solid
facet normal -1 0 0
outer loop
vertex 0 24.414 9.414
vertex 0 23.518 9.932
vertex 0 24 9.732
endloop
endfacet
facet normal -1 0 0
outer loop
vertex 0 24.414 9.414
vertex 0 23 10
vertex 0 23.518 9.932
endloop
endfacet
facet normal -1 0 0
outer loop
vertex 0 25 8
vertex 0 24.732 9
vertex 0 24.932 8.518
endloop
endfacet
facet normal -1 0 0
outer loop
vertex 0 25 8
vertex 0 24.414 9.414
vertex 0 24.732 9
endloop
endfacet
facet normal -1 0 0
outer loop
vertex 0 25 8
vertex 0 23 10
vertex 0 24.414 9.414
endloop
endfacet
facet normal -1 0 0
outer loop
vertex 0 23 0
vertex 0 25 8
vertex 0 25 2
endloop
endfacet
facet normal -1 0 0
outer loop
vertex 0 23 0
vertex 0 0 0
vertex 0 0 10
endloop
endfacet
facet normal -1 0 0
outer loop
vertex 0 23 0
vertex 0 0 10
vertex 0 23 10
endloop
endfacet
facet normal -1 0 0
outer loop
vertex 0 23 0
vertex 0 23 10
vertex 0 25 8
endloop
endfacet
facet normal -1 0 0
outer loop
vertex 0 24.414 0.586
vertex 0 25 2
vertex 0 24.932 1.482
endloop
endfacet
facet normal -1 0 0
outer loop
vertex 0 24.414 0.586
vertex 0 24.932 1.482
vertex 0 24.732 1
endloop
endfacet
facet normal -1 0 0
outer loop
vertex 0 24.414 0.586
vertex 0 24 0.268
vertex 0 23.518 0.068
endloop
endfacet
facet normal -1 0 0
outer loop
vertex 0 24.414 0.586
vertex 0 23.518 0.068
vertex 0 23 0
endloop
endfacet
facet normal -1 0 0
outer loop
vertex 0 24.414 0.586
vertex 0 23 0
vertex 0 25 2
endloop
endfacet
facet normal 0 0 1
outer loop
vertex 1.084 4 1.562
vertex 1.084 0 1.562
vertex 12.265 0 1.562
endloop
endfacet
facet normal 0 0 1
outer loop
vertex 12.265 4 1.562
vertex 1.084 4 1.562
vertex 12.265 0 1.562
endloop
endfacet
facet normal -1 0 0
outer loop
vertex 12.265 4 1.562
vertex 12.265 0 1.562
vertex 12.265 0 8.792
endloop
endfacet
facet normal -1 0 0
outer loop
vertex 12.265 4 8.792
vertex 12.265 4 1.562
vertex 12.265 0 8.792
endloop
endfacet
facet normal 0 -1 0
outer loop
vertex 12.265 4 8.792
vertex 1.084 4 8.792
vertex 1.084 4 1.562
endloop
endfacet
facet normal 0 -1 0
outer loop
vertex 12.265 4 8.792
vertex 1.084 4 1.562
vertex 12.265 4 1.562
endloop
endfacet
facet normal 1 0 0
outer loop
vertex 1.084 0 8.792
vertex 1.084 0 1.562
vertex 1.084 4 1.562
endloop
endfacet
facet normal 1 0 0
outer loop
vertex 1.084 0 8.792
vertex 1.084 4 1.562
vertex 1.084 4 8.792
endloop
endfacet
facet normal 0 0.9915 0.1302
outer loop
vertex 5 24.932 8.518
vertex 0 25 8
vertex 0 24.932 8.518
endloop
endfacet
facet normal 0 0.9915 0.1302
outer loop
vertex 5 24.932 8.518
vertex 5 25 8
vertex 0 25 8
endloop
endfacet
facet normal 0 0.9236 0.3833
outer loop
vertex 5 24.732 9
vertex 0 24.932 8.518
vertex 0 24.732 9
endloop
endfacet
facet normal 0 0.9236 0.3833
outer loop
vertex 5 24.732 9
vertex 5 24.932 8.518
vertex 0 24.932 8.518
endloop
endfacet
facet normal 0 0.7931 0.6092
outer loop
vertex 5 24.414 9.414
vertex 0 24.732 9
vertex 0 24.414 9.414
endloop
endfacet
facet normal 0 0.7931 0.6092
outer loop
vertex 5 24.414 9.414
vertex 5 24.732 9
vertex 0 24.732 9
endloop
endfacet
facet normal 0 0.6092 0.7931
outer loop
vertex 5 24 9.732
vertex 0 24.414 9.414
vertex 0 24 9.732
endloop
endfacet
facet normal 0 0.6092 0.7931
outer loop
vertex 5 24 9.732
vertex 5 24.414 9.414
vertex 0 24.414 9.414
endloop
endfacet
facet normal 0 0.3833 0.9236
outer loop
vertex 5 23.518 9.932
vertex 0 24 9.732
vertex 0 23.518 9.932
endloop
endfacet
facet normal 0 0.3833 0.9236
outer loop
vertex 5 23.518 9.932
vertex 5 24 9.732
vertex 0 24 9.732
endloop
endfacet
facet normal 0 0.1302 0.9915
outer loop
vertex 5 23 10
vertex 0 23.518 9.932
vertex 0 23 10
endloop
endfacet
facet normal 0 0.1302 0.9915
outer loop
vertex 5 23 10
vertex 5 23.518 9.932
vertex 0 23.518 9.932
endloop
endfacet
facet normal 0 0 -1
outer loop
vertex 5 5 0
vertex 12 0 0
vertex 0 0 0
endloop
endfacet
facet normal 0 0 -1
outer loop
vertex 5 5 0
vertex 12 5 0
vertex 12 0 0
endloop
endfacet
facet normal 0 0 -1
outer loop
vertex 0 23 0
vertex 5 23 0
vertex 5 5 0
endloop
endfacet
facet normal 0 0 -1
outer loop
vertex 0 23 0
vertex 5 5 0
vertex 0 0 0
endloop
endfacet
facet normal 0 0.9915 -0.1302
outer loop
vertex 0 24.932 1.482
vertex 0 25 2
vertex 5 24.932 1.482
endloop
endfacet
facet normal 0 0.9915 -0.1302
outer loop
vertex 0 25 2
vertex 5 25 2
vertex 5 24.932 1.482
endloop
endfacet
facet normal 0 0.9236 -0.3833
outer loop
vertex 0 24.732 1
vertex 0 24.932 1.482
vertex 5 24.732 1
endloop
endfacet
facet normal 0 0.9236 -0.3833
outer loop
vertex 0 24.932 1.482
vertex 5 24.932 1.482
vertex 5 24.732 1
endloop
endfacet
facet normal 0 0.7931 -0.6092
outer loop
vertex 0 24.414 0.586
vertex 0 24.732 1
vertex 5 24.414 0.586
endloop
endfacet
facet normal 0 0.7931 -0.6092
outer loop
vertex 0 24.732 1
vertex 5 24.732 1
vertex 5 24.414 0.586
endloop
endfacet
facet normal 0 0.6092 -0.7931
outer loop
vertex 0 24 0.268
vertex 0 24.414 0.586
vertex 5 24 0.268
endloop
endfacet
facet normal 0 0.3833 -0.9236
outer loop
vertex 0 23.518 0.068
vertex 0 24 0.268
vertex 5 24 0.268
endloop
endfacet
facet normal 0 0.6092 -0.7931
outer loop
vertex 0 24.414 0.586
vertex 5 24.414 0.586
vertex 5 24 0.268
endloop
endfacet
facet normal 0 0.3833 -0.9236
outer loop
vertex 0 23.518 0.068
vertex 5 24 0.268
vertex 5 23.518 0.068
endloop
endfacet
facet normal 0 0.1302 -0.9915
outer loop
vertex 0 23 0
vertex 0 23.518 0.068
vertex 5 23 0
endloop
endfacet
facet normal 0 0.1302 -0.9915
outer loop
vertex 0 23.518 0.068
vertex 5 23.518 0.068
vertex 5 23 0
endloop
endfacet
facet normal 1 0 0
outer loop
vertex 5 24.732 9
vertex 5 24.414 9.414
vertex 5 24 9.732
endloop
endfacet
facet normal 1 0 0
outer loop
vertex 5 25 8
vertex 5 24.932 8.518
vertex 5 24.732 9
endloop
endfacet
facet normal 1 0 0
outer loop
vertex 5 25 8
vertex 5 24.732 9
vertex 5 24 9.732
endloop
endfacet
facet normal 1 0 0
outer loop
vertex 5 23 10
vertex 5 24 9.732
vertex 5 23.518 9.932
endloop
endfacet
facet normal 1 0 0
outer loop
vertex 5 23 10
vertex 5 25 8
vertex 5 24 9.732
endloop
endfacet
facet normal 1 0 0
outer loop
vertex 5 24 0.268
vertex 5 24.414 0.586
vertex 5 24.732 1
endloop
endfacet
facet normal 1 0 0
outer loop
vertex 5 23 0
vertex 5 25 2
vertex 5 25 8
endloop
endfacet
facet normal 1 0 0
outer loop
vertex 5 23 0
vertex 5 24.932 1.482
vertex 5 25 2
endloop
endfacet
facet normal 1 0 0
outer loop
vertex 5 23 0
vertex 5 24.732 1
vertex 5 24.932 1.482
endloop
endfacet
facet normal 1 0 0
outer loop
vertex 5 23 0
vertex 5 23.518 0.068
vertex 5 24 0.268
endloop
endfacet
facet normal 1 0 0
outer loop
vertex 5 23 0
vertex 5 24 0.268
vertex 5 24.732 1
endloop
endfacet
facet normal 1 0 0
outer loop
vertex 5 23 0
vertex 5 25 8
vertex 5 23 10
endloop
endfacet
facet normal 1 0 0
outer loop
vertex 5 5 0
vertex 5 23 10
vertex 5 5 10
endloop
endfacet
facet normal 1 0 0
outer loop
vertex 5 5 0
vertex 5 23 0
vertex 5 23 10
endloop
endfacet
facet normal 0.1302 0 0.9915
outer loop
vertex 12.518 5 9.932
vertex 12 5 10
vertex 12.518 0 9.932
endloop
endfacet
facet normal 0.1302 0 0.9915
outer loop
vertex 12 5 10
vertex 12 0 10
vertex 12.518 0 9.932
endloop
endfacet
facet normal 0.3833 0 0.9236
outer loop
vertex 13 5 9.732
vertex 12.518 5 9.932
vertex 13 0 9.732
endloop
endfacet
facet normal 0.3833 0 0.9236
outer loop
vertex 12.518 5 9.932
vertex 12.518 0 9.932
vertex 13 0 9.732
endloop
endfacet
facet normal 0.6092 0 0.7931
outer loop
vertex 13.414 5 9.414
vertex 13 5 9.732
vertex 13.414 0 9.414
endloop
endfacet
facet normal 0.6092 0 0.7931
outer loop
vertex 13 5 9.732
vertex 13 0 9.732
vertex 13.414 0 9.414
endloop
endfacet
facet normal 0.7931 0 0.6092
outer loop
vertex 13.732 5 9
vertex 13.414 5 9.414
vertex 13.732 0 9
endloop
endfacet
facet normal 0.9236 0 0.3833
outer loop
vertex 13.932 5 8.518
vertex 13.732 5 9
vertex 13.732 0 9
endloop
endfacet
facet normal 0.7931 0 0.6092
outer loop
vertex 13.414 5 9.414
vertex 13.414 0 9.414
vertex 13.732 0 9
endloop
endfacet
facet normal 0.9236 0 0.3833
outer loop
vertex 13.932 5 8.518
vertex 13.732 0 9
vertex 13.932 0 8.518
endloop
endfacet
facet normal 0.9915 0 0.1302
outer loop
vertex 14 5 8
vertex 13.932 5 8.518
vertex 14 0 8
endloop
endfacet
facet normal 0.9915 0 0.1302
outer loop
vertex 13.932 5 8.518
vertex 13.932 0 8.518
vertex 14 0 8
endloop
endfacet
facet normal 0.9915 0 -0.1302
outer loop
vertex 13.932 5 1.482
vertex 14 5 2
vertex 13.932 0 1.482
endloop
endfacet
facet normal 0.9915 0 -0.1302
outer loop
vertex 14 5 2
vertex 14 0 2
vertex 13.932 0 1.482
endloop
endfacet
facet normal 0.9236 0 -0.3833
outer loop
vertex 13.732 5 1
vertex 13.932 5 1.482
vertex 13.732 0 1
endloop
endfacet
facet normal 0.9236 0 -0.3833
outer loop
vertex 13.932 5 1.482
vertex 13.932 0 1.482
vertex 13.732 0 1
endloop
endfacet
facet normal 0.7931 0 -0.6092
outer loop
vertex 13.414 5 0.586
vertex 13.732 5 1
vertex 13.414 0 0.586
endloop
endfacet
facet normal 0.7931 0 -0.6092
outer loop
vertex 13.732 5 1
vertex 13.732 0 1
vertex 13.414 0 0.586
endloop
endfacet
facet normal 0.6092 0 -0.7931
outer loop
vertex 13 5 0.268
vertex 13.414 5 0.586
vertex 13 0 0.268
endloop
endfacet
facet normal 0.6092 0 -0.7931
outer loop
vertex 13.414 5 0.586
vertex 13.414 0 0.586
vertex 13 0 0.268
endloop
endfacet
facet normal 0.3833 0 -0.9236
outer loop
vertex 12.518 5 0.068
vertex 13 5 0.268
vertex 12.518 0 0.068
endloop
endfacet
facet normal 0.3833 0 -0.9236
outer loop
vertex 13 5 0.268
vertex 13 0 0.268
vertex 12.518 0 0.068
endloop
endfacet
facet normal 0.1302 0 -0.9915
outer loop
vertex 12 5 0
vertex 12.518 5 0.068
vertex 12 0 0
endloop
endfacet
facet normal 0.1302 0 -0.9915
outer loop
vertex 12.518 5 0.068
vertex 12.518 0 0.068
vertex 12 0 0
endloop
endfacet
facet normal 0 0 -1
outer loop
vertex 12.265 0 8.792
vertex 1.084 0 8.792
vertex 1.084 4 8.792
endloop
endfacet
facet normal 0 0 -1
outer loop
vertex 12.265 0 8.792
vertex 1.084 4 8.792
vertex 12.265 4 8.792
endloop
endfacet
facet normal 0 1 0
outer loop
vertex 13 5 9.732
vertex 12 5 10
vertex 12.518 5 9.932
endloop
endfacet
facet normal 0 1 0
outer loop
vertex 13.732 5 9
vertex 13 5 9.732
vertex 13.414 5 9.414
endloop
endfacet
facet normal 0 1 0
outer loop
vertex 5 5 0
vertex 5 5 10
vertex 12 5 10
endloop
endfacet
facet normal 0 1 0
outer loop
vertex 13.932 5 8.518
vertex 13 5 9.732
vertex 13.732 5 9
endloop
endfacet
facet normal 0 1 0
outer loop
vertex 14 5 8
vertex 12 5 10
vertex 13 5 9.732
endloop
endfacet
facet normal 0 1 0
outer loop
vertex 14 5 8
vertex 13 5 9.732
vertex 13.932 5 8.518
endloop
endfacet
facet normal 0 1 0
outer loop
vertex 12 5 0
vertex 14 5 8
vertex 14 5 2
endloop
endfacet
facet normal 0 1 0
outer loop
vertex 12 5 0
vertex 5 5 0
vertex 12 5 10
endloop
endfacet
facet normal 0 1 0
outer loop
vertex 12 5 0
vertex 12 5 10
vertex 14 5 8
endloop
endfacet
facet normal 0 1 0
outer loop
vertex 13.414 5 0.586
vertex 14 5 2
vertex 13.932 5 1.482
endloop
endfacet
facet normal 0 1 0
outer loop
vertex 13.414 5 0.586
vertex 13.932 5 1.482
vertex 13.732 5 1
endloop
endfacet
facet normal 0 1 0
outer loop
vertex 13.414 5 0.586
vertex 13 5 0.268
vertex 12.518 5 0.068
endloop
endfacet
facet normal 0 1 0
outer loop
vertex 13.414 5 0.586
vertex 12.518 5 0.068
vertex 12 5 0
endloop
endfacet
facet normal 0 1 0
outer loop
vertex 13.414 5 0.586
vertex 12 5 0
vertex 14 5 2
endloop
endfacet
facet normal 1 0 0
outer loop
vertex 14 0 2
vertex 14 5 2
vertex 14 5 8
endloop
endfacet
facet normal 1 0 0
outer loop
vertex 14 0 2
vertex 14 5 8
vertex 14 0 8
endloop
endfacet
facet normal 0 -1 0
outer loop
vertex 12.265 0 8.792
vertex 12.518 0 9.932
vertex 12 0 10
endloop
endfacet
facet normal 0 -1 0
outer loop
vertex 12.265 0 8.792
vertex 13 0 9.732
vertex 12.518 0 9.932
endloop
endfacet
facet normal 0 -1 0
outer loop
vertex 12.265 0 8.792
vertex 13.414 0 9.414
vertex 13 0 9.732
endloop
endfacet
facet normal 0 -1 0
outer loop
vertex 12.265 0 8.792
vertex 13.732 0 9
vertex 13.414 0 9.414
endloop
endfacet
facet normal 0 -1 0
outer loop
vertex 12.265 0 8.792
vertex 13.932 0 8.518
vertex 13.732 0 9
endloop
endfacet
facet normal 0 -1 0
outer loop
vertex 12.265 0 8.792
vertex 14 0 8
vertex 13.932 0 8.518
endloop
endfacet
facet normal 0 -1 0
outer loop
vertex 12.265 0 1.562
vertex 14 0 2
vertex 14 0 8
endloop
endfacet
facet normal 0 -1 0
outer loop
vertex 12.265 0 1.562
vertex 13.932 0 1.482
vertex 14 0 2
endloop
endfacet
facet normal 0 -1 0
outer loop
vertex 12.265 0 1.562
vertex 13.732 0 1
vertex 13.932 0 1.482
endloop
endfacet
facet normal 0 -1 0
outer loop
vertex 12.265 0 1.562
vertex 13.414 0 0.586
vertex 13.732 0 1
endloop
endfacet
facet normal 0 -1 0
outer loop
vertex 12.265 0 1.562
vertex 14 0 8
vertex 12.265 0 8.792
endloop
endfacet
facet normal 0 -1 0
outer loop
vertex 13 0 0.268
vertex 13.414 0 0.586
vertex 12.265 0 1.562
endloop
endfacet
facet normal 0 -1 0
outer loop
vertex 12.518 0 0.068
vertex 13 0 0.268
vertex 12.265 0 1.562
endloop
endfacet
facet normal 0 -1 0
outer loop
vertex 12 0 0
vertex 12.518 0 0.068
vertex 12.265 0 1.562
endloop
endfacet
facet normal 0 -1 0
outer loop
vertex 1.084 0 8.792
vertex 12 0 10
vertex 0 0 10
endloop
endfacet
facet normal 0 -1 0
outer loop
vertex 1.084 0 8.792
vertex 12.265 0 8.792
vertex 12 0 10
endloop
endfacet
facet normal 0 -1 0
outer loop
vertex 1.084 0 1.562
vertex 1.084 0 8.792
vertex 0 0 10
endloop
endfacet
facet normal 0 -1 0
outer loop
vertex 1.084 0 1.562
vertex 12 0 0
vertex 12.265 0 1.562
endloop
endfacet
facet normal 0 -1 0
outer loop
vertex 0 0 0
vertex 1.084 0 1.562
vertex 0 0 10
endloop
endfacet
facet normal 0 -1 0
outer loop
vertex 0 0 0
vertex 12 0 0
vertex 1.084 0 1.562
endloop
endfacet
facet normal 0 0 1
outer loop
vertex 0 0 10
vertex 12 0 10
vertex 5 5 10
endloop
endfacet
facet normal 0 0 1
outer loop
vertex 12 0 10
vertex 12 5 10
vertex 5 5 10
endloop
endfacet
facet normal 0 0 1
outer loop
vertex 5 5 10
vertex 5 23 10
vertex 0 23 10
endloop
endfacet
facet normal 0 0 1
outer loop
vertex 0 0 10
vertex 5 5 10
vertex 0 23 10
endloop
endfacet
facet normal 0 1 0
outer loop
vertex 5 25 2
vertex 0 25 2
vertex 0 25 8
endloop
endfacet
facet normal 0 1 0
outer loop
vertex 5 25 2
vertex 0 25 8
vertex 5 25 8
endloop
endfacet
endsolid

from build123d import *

# Parameters (mm, degrees)
BOSS_EXTRUDE1_DEPTH = 10
FILLET1_R           = 2
FILLET2_R           = 2
FILLET3_R           = 2
FILLET4_R           = 2
SKETCH2_W           = 11.181044811
SKETCH2_H           = 7.229971792
CUT_EXTRUDE1_DEPTH  = 4


with BuildPart() as part:
    # Sketch1 → Boss-Extrude1 (new body)
    with BuildSketch(Plane.XY):
        Polygon((14, 0), (0, 0), (0, 25), (5, 25), (5, 5), (14, 5), align=None)
    extrude(amount=BOSS_EXTRUDE1_DEPTH)

    # Fillet1
    fillet1_edges = [part.edges().sort_by_distance(p)[0] for p in [
        (2.5, 25, 10),
    ]]
    fillet(fillet1_edges, radius=FILLET1_R)

    # Fillet2
    fillet2_edges = [part.edges().sort_by_distance(p)[0] for p in [
        (2.5, 25, 0),
    ]]
    fillet(fillet2_edges, radius=FILLET2_R)

    # Fillet3
    fillet3_edges = [part.edges().sort_by_distance(p)[0] for p in [
        (14, 2.5, 10),
    ]]
    fillet(fillet3_edges, radius=FILLET3_R)

    # Fillet4
    fillet4_edges = [part.edges().sort_by_distance(p)[0] for p in [
        (14, 2.5, 0),
    ]]
    fillet(fillet4_edges, radius=FILLET4_R)

    # Sketch2 → Cut-Extrude1 (cut)
    with BuildSketch(Plane.XZ):
        with Locations((6.674906448, 5.176903909)):
            Rectangle(SKETCH2_W, SKETCH2_H)
    extrude(amount=-CUT_EXTRUDE1_DEPTH, mode=Mode.SUBTRACT)


solid = part.part
